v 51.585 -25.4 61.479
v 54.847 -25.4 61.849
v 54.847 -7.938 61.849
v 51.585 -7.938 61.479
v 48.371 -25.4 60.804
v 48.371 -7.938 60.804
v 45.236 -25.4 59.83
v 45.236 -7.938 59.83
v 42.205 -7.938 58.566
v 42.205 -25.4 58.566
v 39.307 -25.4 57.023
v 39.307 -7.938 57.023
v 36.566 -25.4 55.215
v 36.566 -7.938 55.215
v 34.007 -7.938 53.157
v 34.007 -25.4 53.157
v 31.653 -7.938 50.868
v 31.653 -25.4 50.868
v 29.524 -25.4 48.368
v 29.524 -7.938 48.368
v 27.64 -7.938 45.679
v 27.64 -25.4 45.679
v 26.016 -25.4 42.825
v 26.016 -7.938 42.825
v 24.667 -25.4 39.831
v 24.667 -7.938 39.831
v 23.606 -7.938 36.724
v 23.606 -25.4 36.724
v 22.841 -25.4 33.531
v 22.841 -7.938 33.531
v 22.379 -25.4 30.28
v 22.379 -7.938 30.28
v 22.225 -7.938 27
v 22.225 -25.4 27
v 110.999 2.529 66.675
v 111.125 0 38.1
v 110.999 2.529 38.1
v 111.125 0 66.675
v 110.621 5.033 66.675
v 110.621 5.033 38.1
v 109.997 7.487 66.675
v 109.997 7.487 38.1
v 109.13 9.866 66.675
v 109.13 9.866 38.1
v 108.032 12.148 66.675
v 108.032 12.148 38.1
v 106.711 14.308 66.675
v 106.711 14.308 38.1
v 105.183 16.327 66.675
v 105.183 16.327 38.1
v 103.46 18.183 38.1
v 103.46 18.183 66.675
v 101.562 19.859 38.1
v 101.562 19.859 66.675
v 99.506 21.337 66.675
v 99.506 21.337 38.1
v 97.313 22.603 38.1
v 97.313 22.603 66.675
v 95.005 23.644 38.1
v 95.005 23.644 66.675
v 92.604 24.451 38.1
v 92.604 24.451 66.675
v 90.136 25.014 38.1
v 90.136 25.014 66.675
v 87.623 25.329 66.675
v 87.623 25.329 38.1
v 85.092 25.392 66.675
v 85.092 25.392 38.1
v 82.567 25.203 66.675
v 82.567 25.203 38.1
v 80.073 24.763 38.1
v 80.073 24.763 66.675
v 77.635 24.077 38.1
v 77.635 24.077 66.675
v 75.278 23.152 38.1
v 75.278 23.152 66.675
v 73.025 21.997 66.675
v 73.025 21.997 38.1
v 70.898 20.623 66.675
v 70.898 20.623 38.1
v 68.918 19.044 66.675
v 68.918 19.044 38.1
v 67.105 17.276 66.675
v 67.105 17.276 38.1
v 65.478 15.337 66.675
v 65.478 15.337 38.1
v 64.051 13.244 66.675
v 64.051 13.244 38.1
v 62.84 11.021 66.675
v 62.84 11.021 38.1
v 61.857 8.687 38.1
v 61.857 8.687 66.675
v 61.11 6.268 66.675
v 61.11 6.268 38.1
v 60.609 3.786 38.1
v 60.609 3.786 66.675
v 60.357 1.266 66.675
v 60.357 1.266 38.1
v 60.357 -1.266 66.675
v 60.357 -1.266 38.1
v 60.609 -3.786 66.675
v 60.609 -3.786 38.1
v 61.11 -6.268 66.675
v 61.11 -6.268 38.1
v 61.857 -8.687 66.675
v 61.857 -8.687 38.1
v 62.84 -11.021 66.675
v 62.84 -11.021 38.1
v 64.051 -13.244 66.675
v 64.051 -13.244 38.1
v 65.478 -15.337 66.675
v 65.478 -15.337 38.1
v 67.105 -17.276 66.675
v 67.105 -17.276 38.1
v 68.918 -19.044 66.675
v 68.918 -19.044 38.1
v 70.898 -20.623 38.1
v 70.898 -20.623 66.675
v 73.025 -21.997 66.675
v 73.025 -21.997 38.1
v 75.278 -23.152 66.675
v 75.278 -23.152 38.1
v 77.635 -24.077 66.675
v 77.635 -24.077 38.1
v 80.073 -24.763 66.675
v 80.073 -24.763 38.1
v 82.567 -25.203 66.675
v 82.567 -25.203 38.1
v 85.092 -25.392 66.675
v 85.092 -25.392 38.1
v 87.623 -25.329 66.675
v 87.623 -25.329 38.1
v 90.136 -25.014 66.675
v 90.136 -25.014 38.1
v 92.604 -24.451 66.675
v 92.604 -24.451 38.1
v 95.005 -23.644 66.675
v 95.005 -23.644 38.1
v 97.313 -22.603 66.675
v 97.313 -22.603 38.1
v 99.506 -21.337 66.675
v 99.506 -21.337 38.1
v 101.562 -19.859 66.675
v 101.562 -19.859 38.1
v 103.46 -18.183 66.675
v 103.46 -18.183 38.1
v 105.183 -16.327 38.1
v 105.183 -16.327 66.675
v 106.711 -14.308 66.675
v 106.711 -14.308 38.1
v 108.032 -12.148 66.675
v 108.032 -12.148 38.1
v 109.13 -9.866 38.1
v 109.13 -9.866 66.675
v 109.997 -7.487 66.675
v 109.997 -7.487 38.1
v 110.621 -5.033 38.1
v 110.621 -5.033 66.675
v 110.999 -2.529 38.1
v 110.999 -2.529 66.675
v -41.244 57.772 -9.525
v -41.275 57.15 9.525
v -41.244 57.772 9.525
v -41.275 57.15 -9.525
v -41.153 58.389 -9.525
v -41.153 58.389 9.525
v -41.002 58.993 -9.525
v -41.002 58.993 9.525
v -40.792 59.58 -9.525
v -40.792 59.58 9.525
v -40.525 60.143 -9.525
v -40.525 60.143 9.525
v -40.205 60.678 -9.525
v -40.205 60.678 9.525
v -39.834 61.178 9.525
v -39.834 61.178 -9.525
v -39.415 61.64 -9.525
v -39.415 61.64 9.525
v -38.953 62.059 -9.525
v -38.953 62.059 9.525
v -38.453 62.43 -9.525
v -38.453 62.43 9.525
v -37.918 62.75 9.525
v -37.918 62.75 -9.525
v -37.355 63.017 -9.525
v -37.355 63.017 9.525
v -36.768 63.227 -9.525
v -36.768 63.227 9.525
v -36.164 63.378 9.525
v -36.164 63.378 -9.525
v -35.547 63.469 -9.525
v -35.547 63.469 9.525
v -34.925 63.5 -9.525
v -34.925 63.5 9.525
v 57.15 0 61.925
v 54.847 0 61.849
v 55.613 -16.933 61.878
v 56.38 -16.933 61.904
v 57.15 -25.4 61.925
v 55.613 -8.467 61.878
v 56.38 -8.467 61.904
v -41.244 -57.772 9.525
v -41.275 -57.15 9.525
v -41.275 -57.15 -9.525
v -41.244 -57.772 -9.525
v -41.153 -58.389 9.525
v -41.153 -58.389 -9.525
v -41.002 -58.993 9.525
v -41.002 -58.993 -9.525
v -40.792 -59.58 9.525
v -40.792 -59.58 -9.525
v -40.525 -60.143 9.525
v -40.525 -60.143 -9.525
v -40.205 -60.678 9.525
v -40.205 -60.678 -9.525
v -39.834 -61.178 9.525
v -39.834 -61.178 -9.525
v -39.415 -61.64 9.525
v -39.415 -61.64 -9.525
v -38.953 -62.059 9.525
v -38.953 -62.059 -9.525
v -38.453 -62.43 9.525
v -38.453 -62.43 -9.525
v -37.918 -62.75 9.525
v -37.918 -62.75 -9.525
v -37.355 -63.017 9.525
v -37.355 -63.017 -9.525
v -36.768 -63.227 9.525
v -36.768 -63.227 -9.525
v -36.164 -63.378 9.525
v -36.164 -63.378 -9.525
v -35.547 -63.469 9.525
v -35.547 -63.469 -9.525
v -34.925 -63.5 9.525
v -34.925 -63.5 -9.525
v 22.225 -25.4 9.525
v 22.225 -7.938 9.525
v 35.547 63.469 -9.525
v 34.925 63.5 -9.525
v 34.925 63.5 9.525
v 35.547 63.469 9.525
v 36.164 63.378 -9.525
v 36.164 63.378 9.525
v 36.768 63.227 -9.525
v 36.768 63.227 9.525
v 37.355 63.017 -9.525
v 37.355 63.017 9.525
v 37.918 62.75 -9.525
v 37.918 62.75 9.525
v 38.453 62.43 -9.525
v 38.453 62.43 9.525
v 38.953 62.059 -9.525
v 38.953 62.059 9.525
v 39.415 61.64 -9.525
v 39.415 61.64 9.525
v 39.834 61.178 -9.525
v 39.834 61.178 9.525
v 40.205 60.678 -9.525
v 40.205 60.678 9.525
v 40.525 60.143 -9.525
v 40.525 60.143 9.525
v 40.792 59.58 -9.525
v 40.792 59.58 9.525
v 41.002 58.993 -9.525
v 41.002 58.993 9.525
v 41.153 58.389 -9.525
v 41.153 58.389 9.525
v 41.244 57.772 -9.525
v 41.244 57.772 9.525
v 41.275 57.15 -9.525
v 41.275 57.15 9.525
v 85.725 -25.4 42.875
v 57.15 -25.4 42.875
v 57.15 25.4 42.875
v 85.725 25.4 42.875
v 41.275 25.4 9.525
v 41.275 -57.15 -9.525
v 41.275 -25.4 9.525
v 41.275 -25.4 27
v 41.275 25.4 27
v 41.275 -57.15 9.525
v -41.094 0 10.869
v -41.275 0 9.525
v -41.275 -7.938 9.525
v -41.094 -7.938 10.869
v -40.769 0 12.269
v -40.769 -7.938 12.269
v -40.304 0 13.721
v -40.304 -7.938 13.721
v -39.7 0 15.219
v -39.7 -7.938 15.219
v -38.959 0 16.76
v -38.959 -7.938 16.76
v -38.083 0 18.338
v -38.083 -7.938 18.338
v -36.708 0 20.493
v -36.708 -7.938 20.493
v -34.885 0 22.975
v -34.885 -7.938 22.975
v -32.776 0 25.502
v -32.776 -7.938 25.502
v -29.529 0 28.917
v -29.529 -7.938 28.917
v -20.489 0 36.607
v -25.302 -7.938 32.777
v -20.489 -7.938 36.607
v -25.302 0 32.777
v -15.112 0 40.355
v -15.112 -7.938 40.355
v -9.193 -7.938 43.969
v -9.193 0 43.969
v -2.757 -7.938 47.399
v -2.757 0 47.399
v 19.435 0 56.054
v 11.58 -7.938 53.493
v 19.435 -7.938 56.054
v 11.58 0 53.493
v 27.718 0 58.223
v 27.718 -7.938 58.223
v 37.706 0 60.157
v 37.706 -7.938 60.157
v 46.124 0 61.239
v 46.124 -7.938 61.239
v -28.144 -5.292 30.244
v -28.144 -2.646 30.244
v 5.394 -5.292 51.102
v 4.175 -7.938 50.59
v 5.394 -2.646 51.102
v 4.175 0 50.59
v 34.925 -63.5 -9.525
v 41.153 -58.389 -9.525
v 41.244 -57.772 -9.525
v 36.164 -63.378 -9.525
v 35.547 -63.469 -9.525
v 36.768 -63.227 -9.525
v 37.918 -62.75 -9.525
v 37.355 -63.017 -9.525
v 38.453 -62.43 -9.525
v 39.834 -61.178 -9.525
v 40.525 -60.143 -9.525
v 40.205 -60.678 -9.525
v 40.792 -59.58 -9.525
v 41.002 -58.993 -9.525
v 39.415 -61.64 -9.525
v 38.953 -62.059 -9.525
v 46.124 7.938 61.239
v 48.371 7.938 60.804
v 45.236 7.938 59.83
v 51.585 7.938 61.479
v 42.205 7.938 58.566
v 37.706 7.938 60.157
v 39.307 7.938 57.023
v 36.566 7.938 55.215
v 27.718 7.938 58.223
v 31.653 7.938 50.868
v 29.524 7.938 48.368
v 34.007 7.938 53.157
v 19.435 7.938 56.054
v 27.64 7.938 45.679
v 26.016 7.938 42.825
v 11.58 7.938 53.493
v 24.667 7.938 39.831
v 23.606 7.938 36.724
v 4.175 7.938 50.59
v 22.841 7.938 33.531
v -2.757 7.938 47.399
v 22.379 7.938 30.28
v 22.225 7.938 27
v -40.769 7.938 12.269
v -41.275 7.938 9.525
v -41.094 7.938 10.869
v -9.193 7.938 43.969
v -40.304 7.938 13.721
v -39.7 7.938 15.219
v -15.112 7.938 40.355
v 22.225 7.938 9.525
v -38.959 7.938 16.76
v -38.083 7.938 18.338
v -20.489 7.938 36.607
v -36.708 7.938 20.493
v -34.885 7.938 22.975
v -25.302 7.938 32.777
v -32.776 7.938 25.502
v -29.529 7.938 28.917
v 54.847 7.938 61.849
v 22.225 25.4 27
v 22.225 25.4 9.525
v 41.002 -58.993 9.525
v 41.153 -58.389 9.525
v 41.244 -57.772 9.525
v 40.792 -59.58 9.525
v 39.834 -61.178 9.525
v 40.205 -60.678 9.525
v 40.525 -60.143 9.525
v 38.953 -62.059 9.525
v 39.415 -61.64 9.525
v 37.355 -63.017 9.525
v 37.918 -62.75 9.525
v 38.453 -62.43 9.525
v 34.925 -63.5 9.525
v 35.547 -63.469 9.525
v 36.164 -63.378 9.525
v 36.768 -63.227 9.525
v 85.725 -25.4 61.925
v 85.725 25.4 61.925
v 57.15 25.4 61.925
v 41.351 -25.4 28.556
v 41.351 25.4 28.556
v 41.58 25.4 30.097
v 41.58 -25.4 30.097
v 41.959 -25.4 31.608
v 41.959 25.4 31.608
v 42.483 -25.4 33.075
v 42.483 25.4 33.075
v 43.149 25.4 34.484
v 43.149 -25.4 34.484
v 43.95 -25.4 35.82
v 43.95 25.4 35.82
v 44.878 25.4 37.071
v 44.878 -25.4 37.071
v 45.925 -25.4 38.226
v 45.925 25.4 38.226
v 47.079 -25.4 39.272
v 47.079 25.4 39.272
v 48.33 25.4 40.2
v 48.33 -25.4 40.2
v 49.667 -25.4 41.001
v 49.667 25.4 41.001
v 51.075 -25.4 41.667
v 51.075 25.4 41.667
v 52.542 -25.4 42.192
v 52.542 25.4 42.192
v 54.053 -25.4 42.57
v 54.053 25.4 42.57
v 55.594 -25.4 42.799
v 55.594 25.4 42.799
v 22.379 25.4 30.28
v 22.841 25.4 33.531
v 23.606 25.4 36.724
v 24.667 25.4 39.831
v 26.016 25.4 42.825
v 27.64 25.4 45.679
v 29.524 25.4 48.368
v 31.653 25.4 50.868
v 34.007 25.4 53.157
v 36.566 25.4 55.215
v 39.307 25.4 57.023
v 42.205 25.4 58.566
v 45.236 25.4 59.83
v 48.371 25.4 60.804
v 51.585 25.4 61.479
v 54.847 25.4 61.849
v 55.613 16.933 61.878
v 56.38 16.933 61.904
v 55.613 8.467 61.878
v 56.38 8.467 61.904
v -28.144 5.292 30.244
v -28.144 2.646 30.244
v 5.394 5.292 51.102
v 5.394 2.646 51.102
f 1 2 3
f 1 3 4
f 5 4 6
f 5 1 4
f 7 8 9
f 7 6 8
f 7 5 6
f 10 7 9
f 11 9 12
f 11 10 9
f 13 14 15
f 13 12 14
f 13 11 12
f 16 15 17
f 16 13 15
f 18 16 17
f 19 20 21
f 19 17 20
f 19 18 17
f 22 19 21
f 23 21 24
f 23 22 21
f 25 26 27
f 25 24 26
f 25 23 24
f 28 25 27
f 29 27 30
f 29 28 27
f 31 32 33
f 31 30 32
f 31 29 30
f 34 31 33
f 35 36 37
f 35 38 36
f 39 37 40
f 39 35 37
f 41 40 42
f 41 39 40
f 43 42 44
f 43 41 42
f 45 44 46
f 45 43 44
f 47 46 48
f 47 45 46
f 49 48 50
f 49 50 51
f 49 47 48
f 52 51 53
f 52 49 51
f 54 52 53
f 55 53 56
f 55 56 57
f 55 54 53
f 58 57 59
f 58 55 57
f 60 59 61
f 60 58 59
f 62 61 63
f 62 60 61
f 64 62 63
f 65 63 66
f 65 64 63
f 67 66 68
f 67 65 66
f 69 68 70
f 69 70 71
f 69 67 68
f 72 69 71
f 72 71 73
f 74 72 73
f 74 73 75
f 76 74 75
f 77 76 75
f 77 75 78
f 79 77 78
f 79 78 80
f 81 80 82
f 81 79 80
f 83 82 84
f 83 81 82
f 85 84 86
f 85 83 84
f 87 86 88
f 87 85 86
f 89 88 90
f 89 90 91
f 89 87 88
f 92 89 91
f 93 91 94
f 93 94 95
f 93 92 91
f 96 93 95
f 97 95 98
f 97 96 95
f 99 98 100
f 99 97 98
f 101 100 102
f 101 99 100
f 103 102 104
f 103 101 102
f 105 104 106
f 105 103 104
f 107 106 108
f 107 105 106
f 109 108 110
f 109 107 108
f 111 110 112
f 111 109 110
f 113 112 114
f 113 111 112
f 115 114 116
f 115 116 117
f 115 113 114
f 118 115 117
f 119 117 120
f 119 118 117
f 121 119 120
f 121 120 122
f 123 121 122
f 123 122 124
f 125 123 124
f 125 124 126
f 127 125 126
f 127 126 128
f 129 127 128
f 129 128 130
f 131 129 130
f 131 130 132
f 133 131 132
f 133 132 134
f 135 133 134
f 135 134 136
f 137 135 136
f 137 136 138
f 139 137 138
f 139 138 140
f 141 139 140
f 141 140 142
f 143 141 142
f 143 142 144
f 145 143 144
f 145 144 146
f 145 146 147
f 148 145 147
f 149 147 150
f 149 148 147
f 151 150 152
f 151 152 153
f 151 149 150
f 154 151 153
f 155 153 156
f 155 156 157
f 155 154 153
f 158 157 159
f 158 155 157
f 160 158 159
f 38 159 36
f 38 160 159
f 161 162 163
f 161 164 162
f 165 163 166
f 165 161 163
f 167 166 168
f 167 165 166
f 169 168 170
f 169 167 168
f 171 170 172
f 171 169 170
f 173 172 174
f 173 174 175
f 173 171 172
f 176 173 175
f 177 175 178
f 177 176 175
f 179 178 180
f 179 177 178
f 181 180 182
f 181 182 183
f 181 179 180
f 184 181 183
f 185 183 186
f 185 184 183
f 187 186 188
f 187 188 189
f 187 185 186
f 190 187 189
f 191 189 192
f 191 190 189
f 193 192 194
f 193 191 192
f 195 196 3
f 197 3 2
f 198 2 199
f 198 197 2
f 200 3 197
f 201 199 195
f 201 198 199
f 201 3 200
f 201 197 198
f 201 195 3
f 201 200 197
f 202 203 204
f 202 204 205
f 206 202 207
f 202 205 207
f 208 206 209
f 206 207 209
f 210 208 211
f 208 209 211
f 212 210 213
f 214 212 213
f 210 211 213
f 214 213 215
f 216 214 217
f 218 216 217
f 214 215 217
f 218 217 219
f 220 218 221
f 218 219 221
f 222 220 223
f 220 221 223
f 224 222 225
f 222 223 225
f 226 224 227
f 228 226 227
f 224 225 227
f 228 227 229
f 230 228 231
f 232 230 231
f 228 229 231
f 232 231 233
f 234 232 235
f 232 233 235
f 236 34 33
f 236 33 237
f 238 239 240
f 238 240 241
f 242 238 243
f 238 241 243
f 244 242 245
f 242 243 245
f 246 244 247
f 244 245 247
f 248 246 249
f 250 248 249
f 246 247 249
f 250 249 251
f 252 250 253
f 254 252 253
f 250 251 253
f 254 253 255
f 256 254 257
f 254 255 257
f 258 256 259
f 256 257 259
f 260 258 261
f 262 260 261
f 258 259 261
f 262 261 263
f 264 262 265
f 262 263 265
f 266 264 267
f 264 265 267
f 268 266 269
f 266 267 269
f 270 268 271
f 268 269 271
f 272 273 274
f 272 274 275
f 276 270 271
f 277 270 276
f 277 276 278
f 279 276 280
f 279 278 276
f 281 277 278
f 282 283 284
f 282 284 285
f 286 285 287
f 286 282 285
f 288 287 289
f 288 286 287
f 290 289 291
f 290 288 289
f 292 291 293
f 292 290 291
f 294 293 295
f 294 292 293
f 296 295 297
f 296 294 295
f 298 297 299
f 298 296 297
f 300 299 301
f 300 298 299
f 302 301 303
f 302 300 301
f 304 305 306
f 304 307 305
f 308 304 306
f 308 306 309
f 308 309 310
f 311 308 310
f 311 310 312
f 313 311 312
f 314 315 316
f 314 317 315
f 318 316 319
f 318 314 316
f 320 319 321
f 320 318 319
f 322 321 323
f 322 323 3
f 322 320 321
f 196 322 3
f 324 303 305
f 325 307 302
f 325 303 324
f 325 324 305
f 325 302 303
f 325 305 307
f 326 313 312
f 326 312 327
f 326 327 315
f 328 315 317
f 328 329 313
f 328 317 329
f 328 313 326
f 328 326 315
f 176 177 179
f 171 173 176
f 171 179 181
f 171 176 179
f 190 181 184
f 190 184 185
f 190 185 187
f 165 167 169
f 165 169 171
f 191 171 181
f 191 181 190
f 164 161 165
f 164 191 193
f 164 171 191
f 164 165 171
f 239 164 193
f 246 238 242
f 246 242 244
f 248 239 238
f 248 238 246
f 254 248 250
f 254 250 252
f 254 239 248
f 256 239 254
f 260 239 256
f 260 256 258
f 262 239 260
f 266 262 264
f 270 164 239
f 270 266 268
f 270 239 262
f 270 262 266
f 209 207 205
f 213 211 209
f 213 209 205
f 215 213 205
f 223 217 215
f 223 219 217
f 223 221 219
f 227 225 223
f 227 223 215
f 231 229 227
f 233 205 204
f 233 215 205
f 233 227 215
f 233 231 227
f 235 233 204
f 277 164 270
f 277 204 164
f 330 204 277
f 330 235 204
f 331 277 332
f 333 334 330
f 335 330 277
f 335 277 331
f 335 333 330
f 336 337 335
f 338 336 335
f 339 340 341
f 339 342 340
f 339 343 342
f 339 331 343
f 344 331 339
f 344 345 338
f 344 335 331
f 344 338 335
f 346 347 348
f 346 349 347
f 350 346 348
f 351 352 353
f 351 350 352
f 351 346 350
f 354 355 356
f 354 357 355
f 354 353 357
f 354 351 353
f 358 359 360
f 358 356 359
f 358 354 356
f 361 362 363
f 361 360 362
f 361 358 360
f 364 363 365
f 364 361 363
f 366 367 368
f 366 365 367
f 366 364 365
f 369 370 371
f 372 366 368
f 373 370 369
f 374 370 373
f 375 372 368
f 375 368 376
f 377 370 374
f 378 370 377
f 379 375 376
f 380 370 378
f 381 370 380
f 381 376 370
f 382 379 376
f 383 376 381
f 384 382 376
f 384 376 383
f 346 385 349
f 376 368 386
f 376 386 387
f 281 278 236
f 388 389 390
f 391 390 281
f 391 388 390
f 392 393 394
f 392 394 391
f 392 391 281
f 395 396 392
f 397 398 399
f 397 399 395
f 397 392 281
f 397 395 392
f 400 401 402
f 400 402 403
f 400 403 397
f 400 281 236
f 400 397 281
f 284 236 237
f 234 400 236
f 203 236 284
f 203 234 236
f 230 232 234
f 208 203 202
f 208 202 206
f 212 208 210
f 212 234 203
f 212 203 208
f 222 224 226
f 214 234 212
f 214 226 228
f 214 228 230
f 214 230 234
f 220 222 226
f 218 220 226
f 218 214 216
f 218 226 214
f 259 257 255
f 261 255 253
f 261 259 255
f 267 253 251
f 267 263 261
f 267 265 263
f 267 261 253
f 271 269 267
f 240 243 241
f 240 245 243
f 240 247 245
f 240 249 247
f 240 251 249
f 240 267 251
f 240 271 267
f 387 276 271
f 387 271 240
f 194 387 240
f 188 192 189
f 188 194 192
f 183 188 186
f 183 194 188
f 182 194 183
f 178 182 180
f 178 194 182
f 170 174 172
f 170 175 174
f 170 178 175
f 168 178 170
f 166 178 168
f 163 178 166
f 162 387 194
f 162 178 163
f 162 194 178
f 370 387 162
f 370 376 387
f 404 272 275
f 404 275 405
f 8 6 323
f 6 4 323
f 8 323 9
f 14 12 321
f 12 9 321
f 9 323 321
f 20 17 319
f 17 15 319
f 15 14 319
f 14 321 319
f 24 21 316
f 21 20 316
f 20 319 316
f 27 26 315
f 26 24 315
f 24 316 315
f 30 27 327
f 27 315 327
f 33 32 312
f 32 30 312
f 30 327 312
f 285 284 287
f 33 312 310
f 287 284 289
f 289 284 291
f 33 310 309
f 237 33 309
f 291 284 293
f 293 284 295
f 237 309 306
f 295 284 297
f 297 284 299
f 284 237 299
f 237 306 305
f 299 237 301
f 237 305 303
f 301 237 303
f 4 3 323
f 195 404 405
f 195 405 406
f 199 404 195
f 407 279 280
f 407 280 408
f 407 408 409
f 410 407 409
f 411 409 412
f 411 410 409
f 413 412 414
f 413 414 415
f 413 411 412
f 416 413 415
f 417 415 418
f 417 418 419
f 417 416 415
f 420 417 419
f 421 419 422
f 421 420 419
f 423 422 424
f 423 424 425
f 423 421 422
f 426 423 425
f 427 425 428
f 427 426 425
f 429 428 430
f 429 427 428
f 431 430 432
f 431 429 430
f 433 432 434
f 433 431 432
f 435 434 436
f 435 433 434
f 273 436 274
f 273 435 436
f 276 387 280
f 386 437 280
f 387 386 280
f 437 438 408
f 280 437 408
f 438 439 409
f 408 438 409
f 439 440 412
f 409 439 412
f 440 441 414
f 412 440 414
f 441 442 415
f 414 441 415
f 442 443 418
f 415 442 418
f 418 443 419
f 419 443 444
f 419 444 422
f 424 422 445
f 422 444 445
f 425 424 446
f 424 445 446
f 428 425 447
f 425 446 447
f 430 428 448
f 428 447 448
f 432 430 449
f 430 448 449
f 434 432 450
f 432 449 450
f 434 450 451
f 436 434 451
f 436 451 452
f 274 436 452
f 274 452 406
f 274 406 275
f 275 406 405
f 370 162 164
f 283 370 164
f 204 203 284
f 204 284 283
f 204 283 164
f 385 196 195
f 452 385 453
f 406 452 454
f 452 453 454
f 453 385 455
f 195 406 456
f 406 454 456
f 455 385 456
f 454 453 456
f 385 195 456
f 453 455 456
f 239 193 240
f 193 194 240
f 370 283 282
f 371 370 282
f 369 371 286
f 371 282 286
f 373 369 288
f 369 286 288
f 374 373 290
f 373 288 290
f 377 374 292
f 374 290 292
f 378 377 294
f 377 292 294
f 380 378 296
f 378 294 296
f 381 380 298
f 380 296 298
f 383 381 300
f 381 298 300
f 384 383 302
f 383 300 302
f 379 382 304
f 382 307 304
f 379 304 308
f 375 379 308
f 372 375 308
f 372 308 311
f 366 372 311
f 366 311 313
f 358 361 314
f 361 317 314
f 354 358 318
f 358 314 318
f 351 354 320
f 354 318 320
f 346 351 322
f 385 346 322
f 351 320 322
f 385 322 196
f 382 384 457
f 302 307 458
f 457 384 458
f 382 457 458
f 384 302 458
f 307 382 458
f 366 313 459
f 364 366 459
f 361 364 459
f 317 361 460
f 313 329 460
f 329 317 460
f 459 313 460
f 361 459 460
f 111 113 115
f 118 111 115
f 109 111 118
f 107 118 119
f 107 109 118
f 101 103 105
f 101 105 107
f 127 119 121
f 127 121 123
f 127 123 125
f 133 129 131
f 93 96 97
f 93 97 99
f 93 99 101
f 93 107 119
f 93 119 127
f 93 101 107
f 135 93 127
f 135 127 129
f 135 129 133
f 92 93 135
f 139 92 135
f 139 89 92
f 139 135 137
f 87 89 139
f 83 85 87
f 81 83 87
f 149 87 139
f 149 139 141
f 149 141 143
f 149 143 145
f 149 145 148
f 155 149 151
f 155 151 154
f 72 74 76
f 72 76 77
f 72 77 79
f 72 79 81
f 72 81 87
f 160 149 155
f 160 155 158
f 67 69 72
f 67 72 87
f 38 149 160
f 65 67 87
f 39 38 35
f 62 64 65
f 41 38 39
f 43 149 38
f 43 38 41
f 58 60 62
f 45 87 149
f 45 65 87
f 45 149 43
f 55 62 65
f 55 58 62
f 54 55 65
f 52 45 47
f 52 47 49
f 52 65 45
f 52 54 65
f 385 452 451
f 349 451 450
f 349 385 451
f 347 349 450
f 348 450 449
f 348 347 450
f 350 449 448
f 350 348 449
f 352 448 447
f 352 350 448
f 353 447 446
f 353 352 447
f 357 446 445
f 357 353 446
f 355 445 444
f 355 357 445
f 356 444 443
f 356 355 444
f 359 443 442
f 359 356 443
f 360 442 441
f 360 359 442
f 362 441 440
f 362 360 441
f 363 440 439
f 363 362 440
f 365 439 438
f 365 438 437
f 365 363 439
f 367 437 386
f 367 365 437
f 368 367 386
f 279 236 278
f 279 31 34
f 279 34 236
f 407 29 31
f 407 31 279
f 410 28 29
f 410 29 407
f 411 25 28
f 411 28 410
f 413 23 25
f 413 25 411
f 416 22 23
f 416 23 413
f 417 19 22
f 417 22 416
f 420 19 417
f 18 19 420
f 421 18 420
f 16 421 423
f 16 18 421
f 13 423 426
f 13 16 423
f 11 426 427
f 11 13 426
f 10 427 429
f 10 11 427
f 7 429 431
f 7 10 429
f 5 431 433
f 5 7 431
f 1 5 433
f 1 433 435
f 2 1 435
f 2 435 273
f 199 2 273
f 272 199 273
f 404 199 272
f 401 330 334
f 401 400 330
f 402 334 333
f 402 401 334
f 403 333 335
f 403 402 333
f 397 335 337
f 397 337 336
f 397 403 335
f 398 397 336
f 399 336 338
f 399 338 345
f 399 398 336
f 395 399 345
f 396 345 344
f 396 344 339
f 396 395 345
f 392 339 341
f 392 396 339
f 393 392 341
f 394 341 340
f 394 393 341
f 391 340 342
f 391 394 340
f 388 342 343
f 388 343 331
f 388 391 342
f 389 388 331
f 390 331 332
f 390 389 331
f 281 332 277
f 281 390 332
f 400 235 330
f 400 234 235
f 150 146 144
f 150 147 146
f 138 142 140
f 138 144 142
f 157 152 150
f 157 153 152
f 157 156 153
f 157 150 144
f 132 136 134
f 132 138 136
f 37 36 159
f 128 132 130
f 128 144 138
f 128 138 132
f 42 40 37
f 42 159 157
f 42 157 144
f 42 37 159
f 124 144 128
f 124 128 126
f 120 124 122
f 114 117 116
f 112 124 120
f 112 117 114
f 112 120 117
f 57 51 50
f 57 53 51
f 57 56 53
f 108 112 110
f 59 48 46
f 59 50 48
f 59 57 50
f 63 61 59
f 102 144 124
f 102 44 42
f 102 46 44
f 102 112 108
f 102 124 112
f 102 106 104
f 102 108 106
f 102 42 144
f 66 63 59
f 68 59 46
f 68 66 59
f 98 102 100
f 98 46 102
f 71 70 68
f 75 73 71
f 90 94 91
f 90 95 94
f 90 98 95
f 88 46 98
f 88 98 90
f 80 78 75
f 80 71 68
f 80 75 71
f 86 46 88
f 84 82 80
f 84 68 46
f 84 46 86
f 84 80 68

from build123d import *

# Parameters (mm, degrees)
F1_DEPTH = 63.5
F0_W     = 25.4
F0_H     = 19.05
F2_DEPTH = 25.4
F3_DEPTH = 7.9375
F5_R     = 6.35


with BuildPart() as f1:
    # F0 (on Front) → F1 (new body, symmetric)
    with BuildSketch(Plane.XZ):
        Polygon((-41.275, -9.525), (41.275, -9.525), (41.275, 9.525), (22.225, 9.525), (-41.275, 9.525), align=None)
    extrude(amount=F1_DEPTH, both=True)

    # F0 (on Front) → F2 (join, symmetric)
    with BuildSketch(Plane.XZ):
        with BuildLine():
            Line((22.225, 9.525), (41.275, 9.525))
            Line((41.275, 9.525), (41.275, 27.0002))
            ThreePointArc((41.275, 27.0002), (45.9246798487, 38.2255201513), (57.15, 42.8752))
            Line((57.15, 42.8752), (60.325, 42.8752))
            Line((60.325, 42.8752), (60.325, 61.9252))
            Line((60.325, 61.9252), (57.15, 61.9252))
            add(Edge.make_bspline(
                [(54.8473736997, 61.8492105616), (55.6117304975, 61.880287885), (56.3792898057, 61.9056569823), (57.15, 61.9252)],
                knots=[110.0008146808, 110.0008146808, 110.0008146808, 110.0008146808, 111.5045361635, 111.5045361635, 111.5045361635, 111.5045361635], degree=3))
            ThreePointArc((54.8473736997, 61.8492105616), (31.6531879587, 50.8679229901), (22.225, 27.0002))
            Line((22.225, 27.0002), (22.225, 9.525))
        make_face()
        with Locations((73.025, 52.4002)):
            Rectangle(F0_W, F0_H)
    extrude(amount=F2_DEPTH, both=True)

    # F0 (on Front) → F3 (join, symmetric)
    with BuildSketch(Plane.XZ):
        with BuildLine():
            add(Edge.make_bspline(
                [(-41.275, 9.525), (-39.8441711743, 26.7561814621), (-1.0671499913, 59.5758301952), (54.8473736997, 61.8492105616)],
                knots=[0, 0, 0, 0, 110.0008146808, 110.0008146808, 110.0008146808, 110.0008146808], degree=3))
            Line((-41.275, 9.525), (22.225, 9.525))
            Line((22.225, 9.525), (22.225, 27.0002))
            ThreePointArc((22.225, 27.0002), (31.6531879587, 50.8679229901), (54.8473736997, 61.8492105616))
        make_face()
    extrude(amount=F3_DEPTH, both=True)

    # F5
    f5_edges = [f1.edges().sort_by_distance(p)[0] for p in [
        (41.275, -63.5, 0),
        (-41.275, -63.5, 0),
        (41.275, 63.5, 0),
        (-41.275, 63.5, 0),
    ]]
    fillet(f5_edges, radius=F5_R)


with BuildPart() as f4:
    # F0 (on Front) → F4 (revolve)
    with BuildSketch(Plane.XZ):
        Polygon((85.725, 61.9252), (85.725, 42.8752), (85.725, 38.1), (111.125, 38.1), (111.125, 66.675), (85.725, 66.675), align=None)
    revolve(axis=Axis((85.725, 0, 52.3875), (0, 0, 1)))


solid = Compound([f1.part, f4.part])
